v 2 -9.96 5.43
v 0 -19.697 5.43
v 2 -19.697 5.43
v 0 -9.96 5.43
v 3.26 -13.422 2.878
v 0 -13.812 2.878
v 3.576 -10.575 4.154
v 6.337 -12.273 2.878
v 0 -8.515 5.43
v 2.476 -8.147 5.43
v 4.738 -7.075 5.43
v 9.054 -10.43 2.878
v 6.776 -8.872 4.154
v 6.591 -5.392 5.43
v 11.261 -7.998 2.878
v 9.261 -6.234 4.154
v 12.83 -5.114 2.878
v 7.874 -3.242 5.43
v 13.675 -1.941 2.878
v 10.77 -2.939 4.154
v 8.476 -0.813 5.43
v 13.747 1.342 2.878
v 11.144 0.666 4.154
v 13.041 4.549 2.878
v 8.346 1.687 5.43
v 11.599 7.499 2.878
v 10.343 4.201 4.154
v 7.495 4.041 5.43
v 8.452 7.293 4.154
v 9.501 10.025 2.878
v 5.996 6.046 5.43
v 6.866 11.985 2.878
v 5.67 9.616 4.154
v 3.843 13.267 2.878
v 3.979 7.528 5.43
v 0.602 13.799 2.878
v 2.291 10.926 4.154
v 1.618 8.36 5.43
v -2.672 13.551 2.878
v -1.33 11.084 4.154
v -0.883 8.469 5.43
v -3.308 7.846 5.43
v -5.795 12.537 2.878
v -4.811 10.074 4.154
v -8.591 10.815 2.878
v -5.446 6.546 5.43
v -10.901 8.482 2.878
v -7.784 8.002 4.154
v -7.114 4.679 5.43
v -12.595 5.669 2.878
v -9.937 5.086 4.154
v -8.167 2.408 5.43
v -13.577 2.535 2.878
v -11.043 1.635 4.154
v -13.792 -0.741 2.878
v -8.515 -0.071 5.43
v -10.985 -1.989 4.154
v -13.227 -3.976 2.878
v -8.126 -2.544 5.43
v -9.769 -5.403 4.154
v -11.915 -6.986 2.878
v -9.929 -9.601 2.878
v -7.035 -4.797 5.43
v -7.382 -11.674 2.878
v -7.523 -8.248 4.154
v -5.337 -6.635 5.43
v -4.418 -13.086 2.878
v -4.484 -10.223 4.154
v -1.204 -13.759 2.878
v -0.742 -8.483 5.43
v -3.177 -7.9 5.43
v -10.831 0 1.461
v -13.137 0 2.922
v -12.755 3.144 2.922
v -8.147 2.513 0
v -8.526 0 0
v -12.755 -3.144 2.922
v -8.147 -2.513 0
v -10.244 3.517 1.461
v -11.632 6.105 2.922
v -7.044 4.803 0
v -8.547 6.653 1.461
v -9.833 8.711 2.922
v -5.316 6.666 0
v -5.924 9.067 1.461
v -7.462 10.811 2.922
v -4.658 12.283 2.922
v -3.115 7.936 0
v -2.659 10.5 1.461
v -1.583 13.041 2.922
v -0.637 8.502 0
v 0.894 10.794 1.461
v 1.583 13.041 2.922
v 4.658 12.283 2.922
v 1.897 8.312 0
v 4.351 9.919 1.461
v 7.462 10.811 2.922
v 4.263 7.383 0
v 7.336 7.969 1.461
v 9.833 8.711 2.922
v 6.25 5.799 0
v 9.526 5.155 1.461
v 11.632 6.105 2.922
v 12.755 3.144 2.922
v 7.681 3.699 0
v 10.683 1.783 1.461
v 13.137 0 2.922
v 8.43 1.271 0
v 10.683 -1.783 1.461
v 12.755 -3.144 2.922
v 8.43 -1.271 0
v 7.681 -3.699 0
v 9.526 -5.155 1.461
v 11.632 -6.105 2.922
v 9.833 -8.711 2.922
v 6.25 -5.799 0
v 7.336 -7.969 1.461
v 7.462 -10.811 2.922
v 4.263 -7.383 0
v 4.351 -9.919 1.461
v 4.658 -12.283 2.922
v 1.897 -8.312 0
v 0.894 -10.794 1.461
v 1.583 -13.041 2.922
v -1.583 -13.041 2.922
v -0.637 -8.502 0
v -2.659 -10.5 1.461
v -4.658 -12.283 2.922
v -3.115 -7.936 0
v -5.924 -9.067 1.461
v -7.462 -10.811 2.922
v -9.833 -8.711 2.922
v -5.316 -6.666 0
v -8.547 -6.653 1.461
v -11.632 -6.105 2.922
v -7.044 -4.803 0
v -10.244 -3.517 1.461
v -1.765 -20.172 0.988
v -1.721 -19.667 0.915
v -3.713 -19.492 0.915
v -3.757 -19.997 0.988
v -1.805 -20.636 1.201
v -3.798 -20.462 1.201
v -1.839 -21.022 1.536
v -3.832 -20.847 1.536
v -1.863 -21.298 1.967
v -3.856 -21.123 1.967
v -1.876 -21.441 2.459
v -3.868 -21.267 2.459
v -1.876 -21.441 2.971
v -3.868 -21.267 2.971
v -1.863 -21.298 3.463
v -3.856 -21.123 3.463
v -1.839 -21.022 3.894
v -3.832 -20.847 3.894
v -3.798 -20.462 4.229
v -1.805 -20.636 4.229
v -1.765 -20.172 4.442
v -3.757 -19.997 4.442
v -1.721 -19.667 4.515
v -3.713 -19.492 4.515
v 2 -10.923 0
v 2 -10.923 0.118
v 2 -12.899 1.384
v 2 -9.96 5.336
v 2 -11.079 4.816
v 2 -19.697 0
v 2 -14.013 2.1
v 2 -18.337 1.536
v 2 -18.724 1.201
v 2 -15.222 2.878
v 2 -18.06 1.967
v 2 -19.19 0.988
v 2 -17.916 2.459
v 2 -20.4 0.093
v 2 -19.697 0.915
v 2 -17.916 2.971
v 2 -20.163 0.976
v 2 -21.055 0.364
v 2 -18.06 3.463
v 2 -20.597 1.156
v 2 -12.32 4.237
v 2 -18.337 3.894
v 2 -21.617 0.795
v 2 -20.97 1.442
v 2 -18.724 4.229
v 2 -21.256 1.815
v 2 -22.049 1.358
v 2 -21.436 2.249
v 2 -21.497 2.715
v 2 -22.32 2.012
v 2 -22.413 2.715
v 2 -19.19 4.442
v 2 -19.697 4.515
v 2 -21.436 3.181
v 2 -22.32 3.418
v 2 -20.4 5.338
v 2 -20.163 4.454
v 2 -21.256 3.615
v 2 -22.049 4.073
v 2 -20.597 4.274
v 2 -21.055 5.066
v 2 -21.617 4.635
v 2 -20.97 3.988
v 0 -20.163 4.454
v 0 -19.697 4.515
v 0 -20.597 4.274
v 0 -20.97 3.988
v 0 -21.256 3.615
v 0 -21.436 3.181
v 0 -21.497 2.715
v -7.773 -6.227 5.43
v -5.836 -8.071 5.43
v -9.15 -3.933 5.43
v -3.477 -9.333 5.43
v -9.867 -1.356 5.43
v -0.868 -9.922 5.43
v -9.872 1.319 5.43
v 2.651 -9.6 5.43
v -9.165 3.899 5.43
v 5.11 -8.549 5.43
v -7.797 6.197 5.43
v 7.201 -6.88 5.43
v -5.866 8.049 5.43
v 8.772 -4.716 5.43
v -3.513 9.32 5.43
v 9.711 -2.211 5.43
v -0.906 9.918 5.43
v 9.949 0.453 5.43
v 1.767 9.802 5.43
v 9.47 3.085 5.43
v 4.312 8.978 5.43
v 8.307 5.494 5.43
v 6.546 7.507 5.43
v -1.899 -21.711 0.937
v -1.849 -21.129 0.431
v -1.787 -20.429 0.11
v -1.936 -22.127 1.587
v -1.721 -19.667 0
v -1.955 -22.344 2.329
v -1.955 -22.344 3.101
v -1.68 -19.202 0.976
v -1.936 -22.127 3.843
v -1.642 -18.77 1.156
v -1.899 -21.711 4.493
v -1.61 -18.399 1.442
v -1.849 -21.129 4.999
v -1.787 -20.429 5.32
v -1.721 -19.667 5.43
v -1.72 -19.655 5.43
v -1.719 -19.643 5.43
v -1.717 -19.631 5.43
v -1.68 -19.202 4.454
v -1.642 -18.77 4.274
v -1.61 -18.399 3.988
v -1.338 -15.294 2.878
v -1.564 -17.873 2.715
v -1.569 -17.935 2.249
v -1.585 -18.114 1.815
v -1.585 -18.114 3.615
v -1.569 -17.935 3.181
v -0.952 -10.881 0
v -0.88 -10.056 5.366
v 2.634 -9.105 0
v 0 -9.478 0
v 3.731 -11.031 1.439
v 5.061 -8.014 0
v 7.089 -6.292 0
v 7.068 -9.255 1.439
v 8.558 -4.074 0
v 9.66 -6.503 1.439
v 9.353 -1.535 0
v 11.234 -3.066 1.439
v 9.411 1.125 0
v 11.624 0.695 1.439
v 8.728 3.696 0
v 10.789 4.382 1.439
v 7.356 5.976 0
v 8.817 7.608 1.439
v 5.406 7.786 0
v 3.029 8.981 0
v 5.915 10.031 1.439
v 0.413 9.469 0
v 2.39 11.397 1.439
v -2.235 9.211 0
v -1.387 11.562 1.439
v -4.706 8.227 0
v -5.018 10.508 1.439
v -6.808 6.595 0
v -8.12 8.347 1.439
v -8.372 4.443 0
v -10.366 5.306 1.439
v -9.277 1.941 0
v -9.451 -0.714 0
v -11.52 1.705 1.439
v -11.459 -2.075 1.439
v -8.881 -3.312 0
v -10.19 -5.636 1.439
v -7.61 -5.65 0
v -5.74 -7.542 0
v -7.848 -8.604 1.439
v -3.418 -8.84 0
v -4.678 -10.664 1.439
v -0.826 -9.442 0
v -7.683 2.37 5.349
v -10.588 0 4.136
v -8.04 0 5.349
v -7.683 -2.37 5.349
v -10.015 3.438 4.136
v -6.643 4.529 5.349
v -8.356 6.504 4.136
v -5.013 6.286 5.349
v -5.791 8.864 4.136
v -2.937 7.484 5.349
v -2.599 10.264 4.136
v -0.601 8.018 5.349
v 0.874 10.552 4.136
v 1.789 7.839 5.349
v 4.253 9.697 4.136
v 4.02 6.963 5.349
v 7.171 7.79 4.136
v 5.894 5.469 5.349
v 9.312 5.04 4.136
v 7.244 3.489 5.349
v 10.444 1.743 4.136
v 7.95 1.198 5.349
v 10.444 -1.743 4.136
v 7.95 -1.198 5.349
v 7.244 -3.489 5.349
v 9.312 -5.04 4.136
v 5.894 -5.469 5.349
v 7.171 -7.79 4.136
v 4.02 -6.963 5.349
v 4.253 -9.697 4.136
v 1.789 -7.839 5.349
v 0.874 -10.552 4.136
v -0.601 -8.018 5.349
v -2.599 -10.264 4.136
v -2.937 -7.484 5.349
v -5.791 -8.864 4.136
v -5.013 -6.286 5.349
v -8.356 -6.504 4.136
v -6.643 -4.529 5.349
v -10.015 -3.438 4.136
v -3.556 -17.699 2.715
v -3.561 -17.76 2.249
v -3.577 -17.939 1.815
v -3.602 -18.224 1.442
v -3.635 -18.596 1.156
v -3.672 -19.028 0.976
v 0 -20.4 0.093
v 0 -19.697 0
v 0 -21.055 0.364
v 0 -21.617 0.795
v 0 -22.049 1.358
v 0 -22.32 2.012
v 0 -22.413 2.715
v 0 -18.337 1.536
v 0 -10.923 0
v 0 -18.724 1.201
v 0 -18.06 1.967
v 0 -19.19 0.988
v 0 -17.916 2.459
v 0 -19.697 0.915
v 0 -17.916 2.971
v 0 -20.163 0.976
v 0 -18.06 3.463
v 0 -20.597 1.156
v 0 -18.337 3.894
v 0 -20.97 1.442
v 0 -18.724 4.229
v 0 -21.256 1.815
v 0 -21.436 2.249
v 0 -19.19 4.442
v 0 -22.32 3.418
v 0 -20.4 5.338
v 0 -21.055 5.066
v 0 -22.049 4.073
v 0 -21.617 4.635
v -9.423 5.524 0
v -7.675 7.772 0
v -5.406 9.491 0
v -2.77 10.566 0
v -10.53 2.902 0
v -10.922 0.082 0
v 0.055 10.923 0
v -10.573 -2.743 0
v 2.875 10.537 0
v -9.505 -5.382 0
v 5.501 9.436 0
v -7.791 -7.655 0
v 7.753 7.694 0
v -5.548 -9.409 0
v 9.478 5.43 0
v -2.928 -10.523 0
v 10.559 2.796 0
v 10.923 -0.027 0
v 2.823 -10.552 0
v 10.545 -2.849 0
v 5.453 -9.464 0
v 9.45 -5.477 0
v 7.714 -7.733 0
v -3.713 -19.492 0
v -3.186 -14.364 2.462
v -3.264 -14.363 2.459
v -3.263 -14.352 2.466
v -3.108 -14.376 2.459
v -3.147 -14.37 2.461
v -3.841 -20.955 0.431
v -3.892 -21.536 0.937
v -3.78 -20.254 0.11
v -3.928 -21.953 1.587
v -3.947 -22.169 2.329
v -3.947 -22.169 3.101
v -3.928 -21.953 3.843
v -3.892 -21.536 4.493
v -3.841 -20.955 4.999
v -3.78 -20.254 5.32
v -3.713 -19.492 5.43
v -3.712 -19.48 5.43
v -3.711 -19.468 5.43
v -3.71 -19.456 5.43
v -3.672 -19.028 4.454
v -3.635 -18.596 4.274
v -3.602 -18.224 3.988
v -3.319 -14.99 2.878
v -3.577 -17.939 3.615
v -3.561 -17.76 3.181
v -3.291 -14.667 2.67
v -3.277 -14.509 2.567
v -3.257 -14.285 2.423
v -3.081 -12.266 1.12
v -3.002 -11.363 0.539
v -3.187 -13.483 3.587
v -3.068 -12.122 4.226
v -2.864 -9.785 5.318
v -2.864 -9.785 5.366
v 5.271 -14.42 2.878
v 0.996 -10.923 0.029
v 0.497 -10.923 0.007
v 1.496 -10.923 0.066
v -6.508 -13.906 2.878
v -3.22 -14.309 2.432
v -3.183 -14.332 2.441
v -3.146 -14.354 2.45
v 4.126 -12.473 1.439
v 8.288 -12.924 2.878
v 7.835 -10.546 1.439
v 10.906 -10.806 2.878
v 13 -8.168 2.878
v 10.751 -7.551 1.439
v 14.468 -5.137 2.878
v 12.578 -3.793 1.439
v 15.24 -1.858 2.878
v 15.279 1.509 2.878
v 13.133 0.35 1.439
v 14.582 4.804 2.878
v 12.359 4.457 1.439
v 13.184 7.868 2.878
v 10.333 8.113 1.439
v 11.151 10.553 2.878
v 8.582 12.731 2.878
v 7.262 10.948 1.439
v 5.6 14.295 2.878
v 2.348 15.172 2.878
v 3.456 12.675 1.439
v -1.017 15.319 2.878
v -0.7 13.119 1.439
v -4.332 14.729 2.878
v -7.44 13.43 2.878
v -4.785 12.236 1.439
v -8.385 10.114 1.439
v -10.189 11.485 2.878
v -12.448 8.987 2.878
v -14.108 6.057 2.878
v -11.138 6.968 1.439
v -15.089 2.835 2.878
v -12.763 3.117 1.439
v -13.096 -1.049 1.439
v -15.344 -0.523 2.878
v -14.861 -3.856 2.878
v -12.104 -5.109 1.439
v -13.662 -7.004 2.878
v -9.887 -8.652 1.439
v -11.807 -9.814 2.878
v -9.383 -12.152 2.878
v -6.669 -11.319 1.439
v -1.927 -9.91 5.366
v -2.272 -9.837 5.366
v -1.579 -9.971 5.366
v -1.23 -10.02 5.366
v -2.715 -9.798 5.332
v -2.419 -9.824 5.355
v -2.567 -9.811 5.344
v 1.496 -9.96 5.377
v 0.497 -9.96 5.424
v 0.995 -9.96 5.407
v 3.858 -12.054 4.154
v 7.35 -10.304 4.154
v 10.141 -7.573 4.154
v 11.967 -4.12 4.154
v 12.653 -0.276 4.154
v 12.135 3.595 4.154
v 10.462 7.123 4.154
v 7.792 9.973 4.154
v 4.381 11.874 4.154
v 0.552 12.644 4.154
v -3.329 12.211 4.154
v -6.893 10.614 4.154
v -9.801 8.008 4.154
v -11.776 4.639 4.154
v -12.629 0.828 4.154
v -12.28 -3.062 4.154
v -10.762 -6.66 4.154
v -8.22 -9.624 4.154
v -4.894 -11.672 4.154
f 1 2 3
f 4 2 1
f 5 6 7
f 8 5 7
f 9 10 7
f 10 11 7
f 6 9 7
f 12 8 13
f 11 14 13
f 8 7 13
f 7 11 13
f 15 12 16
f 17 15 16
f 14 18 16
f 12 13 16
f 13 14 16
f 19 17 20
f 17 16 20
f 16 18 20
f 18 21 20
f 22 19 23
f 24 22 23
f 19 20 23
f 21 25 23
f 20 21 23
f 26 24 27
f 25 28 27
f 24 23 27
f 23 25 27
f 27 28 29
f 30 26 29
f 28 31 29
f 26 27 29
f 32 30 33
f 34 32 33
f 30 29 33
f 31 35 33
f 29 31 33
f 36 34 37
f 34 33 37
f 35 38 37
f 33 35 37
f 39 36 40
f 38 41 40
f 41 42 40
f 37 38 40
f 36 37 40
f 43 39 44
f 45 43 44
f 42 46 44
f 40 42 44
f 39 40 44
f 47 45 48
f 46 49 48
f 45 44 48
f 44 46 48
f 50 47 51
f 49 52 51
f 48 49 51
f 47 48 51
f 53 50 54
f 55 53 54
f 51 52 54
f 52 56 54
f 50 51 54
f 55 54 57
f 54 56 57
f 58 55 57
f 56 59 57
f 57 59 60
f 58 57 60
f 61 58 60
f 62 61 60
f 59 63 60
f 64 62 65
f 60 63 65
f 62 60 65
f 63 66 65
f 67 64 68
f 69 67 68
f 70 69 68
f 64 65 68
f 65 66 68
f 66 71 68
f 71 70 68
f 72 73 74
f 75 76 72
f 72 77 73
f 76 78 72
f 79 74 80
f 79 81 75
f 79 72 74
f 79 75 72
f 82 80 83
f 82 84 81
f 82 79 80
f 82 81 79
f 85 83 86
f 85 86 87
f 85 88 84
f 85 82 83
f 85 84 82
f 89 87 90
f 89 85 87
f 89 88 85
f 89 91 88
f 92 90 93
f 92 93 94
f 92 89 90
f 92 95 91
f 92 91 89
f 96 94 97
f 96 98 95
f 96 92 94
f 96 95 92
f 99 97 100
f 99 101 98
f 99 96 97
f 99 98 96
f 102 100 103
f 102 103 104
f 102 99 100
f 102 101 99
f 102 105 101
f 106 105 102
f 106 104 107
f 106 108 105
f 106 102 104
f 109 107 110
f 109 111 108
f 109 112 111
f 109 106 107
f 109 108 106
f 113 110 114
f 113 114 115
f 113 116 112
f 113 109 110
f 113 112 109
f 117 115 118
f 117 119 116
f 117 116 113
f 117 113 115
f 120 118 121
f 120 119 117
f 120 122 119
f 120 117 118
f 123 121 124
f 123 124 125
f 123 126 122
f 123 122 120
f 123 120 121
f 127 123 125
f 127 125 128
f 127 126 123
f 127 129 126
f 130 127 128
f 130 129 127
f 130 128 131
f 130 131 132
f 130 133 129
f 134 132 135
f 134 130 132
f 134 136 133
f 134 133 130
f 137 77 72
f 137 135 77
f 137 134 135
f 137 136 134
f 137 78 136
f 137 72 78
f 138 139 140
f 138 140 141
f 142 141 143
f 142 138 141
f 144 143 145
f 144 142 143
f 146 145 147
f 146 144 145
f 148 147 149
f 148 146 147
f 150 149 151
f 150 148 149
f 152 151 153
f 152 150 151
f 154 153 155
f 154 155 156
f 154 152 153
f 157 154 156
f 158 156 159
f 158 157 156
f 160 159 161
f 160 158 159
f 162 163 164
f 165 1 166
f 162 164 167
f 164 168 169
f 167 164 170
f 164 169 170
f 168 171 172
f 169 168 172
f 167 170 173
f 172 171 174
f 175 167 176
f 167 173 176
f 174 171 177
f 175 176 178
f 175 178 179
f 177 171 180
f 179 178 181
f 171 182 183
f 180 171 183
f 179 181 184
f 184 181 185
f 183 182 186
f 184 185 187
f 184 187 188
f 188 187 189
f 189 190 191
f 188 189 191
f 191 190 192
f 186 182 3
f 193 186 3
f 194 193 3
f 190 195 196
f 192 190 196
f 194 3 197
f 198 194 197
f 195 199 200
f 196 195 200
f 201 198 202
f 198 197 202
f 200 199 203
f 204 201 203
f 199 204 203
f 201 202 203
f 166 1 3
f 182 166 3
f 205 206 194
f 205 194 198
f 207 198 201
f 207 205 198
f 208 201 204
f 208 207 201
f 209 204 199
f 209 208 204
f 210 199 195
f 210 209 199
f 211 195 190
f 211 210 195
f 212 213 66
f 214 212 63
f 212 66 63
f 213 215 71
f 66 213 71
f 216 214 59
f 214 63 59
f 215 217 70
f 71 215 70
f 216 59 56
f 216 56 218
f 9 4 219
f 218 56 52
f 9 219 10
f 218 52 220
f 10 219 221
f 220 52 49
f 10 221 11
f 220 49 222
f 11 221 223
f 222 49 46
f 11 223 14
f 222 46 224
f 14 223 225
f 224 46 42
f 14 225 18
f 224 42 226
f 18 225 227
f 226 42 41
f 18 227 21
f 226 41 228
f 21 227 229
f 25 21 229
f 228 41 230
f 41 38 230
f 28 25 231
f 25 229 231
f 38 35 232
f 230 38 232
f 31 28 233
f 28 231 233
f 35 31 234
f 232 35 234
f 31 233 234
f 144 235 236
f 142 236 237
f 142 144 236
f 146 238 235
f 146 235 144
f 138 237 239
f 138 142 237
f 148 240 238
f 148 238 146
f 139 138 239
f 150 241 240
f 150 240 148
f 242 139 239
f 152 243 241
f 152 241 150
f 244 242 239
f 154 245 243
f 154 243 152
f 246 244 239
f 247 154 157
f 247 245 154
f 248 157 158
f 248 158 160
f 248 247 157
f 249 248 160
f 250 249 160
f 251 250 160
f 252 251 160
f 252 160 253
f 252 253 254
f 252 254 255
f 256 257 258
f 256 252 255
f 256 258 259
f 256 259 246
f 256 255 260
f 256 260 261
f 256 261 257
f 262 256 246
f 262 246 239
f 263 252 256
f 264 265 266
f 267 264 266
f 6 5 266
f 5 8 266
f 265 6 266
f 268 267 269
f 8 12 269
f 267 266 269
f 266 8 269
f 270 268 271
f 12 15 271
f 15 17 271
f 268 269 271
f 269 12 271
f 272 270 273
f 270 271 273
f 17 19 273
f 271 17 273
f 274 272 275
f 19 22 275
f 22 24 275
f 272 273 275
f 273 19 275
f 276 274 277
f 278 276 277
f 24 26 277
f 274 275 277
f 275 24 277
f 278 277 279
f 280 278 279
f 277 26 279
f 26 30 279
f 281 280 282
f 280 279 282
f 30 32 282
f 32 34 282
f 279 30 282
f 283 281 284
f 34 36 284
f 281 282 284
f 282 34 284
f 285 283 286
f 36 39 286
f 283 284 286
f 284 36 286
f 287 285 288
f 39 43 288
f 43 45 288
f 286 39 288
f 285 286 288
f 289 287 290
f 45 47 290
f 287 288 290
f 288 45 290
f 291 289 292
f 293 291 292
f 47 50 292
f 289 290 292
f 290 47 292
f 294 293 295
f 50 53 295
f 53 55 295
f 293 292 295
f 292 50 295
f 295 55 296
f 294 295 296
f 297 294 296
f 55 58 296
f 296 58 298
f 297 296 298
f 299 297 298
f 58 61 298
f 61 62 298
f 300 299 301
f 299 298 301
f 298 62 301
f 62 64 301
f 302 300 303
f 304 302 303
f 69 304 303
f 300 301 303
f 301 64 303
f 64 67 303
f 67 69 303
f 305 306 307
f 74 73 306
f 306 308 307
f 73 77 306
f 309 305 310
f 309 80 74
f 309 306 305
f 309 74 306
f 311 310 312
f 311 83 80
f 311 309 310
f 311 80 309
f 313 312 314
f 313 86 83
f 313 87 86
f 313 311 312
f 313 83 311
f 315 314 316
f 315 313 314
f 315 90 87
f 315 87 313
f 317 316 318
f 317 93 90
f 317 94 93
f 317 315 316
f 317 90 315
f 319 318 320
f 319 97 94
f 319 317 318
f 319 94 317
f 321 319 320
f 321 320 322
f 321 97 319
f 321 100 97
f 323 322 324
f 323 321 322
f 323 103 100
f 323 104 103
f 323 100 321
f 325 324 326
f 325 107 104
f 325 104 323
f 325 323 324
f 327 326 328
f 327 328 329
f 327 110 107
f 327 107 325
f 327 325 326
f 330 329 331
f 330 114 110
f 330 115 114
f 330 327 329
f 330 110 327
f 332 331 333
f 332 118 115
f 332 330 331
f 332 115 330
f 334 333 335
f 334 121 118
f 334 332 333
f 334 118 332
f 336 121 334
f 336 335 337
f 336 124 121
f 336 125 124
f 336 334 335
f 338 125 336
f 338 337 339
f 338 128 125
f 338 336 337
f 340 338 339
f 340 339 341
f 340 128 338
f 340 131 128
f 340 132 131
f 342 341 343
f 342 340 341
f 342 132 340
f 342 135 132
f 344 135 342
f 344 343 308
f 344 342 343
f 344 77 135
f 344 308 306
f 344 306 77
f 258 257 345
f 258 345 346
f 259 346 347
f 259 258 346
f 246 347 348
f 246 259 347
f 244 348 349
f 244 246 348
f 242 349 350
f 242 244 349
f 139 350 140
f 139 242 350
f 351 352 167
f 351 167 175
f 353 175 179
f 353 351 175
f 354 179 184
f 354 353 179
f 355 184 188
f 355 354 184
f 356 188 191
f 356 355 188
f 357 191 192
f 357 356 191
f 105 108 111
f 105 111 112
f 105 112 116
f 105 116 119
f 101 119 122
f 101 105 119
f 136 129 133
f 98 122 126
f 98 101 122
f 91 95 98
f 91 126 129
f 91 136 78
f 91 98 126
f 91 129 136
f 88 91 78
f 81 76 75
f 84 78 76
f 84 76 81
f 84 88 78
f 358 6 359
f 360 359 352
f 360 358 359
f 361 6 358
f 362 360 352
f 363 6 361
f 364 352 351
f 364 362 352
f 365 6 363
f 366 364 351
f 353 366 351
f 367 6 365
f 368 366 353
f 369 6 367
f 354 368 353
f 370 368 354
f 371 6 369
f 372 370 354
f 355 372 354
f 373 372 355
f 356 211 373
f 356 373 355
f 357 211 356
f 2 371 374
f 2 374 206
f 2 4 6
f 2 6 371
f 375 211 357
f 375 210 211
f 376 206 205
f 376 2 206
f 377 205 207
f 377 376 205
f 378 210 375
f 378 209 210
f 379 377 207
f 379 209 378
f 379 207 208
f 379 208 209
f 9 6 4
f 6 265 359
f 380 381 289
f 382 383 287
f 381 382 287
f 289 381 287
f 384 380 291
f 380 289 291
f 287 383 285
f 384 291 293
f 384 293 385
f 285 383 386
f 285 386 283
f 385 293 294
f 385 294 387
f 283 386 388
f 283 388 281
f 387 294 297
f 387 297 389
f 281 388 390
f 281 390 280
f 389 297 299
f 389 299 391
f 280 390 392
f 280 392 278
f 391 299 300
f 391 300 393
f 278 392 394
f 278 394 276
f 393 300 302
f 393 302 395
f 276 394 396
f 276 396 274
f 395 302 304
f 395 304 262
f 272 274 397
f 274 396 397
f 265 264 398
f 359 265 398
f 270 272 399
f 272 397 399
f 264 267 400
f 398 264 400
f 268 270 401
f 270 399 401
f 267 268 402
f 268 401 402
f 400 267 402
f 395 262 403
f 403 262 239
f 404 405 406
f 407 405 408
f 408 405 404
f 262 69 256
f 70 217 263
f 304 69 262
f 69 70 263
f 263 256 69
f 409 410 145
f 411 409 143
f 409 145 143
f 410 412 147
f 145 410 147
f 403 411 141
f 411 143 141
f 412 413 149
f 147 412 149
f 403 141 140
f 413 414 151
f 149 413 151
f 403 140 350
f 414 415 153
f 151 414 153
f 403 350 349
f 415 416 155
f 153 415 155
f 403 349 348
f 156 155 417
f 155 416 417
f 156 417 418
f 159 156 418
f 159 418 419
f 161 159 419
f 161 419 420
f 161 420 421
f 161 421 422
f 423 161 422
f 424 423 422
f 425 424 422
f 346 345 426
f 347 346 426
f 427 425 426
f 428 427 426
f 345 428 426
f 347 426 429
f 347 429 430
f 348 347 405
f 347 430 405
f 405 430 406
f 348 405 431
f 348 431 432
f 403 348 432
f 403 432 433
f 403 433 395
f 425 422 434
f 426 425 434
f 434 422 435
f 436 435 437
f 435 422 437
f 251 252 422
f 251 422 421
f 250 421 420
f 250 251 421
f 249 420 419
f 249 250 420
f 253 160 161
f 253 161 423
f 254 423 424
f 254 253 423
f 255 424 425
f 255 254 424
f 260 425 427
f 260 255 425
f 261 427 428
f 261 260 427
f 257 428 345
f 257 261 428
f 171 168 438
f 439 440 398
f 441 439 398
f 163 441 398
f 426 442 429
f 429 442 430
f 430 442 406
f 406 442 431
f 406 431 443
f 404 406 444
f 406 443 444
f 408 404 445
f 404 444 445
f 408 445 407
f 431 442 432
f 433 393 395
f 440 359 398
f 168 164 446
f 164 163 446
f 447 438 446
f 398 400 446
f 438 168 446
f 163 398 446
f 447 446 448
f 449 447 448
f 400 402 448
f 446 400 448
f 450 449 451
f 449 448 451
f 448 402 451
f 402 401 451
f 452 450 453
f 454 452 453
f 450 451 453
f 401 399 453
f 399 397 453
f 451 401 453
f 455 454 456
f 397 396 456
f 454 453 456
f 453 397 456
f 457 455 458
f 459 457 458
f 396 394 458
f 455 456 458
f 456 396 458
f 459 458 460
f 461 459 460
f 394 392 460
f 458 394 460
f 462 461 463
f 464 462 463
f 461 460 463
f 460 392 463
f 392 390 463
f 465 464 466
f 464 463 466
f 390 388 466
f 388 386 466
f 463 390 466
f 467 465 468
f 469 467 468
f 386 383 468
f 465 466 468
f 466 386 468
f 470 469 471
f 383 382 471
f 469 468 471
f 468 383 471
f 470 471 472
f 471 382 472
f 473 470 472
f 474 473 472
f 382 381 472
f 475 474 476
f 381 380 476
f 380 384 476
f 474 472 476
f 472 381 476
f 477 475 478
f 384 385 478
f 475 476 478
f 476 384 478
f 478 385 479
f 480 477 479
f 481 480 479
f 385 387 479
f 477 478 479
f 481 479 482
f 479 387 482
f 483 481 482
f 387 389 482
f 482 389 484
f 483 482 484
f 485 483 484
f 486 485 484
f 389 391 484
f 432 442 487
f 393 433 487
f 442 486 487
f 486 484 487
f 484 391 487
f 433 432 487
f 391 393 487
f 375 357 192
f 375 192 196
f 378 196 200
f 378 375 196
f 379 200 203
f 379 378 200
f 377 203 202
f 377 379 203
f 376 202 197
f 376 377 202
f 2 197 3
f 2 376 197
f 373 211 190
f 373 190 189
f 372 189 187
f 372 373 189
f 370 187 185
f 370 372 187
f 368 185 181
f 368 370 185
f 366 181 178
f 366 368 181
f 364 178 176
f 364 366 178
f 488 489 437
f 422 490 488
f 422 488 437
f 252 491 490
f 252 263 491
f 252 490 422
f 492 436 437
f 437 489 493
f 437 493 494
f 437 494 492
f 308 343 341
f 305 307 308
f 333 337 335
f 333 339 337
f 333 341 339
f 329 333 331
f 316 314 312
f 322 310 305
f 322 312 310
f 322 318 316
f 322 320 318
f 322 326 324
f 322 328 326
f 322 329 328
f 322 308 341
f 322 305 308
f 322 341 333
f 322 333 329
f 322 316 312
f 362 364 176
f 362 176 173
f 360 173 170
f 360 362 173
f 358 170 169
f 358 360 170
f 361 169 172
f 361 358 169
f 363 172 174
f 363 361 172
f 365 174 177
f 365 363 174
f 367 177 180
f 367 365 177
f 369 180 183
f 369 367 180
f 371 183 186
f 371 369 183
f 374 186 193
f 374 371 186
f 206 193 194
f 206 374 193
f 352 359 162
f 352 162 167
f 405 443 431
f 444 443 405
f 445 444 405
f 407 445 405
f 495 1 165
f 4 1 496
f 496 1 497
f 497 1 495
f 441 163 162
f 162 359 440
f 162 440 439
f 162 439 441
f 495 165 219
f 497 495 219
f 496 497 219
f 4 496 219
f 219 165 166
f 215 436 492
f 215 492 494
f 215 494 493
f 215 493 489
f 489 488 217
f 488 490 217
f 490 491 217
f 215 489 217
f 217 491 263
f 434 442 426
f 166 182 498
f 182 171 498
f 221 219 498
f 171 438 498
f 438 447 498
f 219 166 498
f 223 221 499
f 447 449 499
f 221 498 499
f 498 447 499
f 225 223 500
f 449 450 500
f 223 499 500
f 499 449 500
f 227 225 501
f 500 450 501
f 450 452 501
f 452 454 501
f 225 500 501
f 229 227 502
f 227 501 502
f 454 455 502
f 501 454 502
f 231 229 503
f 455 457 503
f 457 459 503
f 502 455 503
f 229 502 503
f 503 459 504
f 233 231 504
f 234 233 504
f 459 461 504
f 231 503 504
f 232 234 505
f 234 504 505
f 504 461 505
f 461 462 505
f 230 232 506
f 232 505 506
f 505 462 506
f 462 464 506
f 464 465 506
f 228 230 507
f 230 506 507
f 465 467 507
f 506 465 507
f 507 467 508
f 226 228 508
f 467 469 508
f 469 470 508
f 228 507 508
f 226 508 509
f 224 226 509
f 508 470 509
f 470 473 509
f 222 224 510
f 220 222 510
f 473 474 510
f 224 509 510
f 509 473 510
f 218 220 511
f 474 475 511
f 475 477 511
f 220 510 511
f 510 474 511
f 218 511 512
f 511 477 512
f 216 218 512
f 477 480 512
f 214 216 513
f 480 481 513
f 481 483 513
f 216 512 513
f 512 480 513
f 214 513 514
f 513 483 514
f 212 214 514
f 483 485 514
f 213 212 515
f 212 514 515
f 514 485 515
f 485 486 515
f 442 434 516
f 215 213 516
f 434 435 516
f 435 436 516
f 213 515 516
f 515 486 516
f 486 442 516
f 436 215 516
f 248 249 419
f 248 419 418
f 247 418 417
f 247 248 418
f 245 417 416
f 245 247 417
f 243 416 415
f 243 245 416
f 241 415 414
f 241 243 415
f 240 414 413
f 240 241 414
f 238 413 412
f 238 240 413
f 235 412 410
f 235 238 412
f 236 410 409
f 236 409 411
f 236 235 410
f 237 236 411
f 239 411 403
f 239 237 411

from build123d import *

# Parameters (mm, degrees)
F4_ANGLE = 355
F6_DEPTH = 2
F9_DEPTH = 2


with BuildPart() as f1:
    # F0 (on Front) → F1 (revolve)
    with BuildSketch(Plane.XZ):
        Polygon((-8.5256528109, 0), (0, 0), (0, 5.3492360748), (-8.0402912572, 5.3492360748), (-13.1365936249, 2.9224255122), align=None)
    revolve(axis=Axis((0, 0, 2.6746180374), (0, 0, -1)))


with BuildPart() as f4:
    # F2 (on Right) → F4 (revolve)
    with BuildSketch(Plane.YZ):
        Polygon((-10.9227513894, 0), (-9.4781313092, 0), (-13.8119934127, 2.8779460117), (-8.5150506347, 5.4301088676), (-9.9596716464, 5.4301088676), (-15.3529215604, 2.8779460117), align=None)
    revolve(axis=Axis((0, 0, 3.4475456923), (0, 0, 1)), revolution_arc=F4_ANGLE)

    # F5 (on face) → F6 (join)
    with BuildSketch(Plane(origin=(0, 0, 0), x_dir=(0, -1, 0), z_dir=(-1, 0, 0))):
        with BuildLine():
            Line((19.6974463761, 5.4301088676), (9.9596716464, 5.4301088676))
            Line((9.9596716464, 5.4301088676), (9.9596716464, 5.1421355456))
            Line((9.9596716464, 5.1421355456), (14.8787824938, 2.8143420651))
            Line((14.8787824938, 2.8143420651), (18.0616624244, 4.8820180795))
            ThreePointArc((18.0616624244, 4.8820180795), (18.8348641121, 5.2894422088), (19.6974463761, 5.4301088676))
        make_face()
        with BuildLine():
            ThreePointArc((22.4125008099, 2.7150544338), (21.6172797775, 4.6348878352), (19.6974463761, 5.4301088676))
            Line((19.6974463761, 5.4301088676), (19.6974463761, 4.5150544338))
            ThreePointArc((19.6974463761, 4.5150544338), (20.9702385822, 3.9878466399), (21.4974463761, 2.7150544338))
            ThreePointArc((21.4974463761, 2.7150544338), (20.9702385822, 1.4422622277), (19.6974463761, 0.9150544338))
            Line((19.6974463761, 0.9150544338), (19.6974463761, 0))
            ThreePointArc((19.6974463761, 0), (21.6172797775, 0.7952210324), (22.4125008099, 2.7150544338))
        make_face()
        with BuildLine():
            Line((19.6974463761, 4.5150544338), (19.6974463761, 5.4301088676))
            ThreePointArc((19.6974463761, 5.4301088676), (18.8348641121, 5.2894422088), (18.0616624244, 4.8820180795))
            ThreePointArc((18.0616624244, 4.8820180795), (17.0857219121, 3.456954631), (17.1667503073, 1.7316430317))
            ThreePointArc((17.1667503073, 1.7316430317), (18.1642299708, 0.4743473951), (19.6974463761, 0))
            Line((19.6974463761, 0), (19.6974463761, 0.9150544338))
            ThreePointArc((19.6974463761, 0.9150544338), (17.8974463761, 2.7150544338), (19.6974463761, 4.5150544338))
        make_face()
        with BuildLine():
            ThreePointArc((17.1667503073, 1.7316430317), (17.0857219121, 3.456954631), (18.0616624244, 4.8820180795))
            Line((18.0616624244, 4.8820180795), (14.8787824938, 2.8143420651))
            Line((14.8787824938, 2.8143420651), (17.1667503073, 1.7316430317))
        make_face()
        with BuildLine():
            Line((17.1667503073, 1.7316430317), (14.8787824938, 2.8143420651))
            Line((14.8787824938, 2.8143420651), (10.9227513894, 0.2444082929))
            Line((10.9227513894, 0.2444082929), (10.9227513894, 0))
            Line((10.9227513894, 0), (19.6974463761, 0))
            ThreePointArc((19.6974463761, 0), (18.1642299708, 0.4743473951), (17.1667503073, 1.7316430317))
        make_face()
    extrude(amount=-F6_DEPTH)

    # F8 (on offset) → F9 (join)
    with BuildSketch(Plane(origin=(0, 0, 0), x_dir=(0.0871557427, 0.9961946981, 0), z_dir=(0.9961946981, -0.0871557427, 0))):
        with BuildLine():
            Line((-9.9978353828, 5.3655281663), (-19.741717726, 5.4301088676))
            ThreePointArc((-19.741717726, 5.4301088676), (-18.2085013207, 4.9557614724), (-17.2110216572, 3.6984658359))
            Line((-17.2110216572, 3.6984658359), (-14.5926705645, 2.4594247181))
            Line((-14.5926705645, 2.4594247181), (-9.9978353828, 4.9591703566))
            Line((-9.9978353828, 4.9591703566), (-9.9978353828, 5.3655281663))
        make_face()
        with BuildLine():
            Line((-19.741717726, 0), (-10.0039429963, 0))
            Line((-10.0039429963, 0), (-10.0039429963, 0.287973322))
            Line((-10.0039429963, 0.287973322), (-14.5926705645, 2.4594247181))
            Line((-14.5926705645, 2.4594247181), (-18.1059337743, 0.5480907881))
            ThreePointArc((-18.1059337743, 0.5480907881), (-18.879135462, 0.1406666587), (-19.741717726, 0))
        make_face()
        with BuildLine():
            ThreePointArc((-19.741717726, 5.4301088676), (-22.4567721598, 2.7150544338), (-19.741717726, 0))
            Line((-19.741717726, 0), (-19.741717726, 0.9150544338))
            ThreePointArc((-19.741717726, 0.9150544338), (-21.541717726, 2.7150544338), (-19.741717726, 4.5150544338))
            Line((-19.741717726, 4.5150544338), (-19.741717726, 5.4301088676))
        make_face()
        with BuildLine():
            Line((-19.741717726, 0.9150544338), (-19.741717726, 0))
            ThreePointArc((-19.741717726, 0), (-18.879135462, 0.1406666587), (-18.1059337743, 0.5480907881))
            ThreePointArc((-18.1059337743, 0.5480907881), (-17.3114129047, 1.5046251488), (-17.0266632922, 2.7150544338))
            ThreePointArc((-17.0266632922, 2.7150544338), (-17.0731508671, 3.2153258583), (-17.2110216572, 3.6984658359))
            ThreePointArc((-17.2110216572, 3.6984658359), (-18.2085013207, 4.9557614724), (-19.741717726, 5.4301088676))
            Line((-19.741717726, 5.4301088676), (-19.741717726, 4.5150544338))
            ThreePointArc((-19.741717726, 4.5150544338), (-18.4689255199, 3.9878466399), (-17.941717726, 2.7150544338))
            ThreePointArc((-17.941717726, 2.7150544338), (-18.4689255199, 1.4422622277), (-19.741717726, 0.9150544338))
        make_face()
        with BuildLine():
            ThreePointArc((-17.0266632922, 2.7150544338), (-17.3114129047, 1.5046251488), (-18.1059337743, 0.5480907881))
            Line((-18.1059337743, 0.5480907881), (-14.5926705645, 2.4594247181))
            Line((-14.5926705645, 2.4594247181), (-17.2110216572, 3.6984658359))
            ThreePointArc((-17.2110216572, 3.6984658359), (-17.0731508671, 3.2153258583), (-17.0266632922, 2.7150544338))
        make_face()
    extrude(amount=-F9_DEPTH)


solid = Compound([f1.part, f4.part])
